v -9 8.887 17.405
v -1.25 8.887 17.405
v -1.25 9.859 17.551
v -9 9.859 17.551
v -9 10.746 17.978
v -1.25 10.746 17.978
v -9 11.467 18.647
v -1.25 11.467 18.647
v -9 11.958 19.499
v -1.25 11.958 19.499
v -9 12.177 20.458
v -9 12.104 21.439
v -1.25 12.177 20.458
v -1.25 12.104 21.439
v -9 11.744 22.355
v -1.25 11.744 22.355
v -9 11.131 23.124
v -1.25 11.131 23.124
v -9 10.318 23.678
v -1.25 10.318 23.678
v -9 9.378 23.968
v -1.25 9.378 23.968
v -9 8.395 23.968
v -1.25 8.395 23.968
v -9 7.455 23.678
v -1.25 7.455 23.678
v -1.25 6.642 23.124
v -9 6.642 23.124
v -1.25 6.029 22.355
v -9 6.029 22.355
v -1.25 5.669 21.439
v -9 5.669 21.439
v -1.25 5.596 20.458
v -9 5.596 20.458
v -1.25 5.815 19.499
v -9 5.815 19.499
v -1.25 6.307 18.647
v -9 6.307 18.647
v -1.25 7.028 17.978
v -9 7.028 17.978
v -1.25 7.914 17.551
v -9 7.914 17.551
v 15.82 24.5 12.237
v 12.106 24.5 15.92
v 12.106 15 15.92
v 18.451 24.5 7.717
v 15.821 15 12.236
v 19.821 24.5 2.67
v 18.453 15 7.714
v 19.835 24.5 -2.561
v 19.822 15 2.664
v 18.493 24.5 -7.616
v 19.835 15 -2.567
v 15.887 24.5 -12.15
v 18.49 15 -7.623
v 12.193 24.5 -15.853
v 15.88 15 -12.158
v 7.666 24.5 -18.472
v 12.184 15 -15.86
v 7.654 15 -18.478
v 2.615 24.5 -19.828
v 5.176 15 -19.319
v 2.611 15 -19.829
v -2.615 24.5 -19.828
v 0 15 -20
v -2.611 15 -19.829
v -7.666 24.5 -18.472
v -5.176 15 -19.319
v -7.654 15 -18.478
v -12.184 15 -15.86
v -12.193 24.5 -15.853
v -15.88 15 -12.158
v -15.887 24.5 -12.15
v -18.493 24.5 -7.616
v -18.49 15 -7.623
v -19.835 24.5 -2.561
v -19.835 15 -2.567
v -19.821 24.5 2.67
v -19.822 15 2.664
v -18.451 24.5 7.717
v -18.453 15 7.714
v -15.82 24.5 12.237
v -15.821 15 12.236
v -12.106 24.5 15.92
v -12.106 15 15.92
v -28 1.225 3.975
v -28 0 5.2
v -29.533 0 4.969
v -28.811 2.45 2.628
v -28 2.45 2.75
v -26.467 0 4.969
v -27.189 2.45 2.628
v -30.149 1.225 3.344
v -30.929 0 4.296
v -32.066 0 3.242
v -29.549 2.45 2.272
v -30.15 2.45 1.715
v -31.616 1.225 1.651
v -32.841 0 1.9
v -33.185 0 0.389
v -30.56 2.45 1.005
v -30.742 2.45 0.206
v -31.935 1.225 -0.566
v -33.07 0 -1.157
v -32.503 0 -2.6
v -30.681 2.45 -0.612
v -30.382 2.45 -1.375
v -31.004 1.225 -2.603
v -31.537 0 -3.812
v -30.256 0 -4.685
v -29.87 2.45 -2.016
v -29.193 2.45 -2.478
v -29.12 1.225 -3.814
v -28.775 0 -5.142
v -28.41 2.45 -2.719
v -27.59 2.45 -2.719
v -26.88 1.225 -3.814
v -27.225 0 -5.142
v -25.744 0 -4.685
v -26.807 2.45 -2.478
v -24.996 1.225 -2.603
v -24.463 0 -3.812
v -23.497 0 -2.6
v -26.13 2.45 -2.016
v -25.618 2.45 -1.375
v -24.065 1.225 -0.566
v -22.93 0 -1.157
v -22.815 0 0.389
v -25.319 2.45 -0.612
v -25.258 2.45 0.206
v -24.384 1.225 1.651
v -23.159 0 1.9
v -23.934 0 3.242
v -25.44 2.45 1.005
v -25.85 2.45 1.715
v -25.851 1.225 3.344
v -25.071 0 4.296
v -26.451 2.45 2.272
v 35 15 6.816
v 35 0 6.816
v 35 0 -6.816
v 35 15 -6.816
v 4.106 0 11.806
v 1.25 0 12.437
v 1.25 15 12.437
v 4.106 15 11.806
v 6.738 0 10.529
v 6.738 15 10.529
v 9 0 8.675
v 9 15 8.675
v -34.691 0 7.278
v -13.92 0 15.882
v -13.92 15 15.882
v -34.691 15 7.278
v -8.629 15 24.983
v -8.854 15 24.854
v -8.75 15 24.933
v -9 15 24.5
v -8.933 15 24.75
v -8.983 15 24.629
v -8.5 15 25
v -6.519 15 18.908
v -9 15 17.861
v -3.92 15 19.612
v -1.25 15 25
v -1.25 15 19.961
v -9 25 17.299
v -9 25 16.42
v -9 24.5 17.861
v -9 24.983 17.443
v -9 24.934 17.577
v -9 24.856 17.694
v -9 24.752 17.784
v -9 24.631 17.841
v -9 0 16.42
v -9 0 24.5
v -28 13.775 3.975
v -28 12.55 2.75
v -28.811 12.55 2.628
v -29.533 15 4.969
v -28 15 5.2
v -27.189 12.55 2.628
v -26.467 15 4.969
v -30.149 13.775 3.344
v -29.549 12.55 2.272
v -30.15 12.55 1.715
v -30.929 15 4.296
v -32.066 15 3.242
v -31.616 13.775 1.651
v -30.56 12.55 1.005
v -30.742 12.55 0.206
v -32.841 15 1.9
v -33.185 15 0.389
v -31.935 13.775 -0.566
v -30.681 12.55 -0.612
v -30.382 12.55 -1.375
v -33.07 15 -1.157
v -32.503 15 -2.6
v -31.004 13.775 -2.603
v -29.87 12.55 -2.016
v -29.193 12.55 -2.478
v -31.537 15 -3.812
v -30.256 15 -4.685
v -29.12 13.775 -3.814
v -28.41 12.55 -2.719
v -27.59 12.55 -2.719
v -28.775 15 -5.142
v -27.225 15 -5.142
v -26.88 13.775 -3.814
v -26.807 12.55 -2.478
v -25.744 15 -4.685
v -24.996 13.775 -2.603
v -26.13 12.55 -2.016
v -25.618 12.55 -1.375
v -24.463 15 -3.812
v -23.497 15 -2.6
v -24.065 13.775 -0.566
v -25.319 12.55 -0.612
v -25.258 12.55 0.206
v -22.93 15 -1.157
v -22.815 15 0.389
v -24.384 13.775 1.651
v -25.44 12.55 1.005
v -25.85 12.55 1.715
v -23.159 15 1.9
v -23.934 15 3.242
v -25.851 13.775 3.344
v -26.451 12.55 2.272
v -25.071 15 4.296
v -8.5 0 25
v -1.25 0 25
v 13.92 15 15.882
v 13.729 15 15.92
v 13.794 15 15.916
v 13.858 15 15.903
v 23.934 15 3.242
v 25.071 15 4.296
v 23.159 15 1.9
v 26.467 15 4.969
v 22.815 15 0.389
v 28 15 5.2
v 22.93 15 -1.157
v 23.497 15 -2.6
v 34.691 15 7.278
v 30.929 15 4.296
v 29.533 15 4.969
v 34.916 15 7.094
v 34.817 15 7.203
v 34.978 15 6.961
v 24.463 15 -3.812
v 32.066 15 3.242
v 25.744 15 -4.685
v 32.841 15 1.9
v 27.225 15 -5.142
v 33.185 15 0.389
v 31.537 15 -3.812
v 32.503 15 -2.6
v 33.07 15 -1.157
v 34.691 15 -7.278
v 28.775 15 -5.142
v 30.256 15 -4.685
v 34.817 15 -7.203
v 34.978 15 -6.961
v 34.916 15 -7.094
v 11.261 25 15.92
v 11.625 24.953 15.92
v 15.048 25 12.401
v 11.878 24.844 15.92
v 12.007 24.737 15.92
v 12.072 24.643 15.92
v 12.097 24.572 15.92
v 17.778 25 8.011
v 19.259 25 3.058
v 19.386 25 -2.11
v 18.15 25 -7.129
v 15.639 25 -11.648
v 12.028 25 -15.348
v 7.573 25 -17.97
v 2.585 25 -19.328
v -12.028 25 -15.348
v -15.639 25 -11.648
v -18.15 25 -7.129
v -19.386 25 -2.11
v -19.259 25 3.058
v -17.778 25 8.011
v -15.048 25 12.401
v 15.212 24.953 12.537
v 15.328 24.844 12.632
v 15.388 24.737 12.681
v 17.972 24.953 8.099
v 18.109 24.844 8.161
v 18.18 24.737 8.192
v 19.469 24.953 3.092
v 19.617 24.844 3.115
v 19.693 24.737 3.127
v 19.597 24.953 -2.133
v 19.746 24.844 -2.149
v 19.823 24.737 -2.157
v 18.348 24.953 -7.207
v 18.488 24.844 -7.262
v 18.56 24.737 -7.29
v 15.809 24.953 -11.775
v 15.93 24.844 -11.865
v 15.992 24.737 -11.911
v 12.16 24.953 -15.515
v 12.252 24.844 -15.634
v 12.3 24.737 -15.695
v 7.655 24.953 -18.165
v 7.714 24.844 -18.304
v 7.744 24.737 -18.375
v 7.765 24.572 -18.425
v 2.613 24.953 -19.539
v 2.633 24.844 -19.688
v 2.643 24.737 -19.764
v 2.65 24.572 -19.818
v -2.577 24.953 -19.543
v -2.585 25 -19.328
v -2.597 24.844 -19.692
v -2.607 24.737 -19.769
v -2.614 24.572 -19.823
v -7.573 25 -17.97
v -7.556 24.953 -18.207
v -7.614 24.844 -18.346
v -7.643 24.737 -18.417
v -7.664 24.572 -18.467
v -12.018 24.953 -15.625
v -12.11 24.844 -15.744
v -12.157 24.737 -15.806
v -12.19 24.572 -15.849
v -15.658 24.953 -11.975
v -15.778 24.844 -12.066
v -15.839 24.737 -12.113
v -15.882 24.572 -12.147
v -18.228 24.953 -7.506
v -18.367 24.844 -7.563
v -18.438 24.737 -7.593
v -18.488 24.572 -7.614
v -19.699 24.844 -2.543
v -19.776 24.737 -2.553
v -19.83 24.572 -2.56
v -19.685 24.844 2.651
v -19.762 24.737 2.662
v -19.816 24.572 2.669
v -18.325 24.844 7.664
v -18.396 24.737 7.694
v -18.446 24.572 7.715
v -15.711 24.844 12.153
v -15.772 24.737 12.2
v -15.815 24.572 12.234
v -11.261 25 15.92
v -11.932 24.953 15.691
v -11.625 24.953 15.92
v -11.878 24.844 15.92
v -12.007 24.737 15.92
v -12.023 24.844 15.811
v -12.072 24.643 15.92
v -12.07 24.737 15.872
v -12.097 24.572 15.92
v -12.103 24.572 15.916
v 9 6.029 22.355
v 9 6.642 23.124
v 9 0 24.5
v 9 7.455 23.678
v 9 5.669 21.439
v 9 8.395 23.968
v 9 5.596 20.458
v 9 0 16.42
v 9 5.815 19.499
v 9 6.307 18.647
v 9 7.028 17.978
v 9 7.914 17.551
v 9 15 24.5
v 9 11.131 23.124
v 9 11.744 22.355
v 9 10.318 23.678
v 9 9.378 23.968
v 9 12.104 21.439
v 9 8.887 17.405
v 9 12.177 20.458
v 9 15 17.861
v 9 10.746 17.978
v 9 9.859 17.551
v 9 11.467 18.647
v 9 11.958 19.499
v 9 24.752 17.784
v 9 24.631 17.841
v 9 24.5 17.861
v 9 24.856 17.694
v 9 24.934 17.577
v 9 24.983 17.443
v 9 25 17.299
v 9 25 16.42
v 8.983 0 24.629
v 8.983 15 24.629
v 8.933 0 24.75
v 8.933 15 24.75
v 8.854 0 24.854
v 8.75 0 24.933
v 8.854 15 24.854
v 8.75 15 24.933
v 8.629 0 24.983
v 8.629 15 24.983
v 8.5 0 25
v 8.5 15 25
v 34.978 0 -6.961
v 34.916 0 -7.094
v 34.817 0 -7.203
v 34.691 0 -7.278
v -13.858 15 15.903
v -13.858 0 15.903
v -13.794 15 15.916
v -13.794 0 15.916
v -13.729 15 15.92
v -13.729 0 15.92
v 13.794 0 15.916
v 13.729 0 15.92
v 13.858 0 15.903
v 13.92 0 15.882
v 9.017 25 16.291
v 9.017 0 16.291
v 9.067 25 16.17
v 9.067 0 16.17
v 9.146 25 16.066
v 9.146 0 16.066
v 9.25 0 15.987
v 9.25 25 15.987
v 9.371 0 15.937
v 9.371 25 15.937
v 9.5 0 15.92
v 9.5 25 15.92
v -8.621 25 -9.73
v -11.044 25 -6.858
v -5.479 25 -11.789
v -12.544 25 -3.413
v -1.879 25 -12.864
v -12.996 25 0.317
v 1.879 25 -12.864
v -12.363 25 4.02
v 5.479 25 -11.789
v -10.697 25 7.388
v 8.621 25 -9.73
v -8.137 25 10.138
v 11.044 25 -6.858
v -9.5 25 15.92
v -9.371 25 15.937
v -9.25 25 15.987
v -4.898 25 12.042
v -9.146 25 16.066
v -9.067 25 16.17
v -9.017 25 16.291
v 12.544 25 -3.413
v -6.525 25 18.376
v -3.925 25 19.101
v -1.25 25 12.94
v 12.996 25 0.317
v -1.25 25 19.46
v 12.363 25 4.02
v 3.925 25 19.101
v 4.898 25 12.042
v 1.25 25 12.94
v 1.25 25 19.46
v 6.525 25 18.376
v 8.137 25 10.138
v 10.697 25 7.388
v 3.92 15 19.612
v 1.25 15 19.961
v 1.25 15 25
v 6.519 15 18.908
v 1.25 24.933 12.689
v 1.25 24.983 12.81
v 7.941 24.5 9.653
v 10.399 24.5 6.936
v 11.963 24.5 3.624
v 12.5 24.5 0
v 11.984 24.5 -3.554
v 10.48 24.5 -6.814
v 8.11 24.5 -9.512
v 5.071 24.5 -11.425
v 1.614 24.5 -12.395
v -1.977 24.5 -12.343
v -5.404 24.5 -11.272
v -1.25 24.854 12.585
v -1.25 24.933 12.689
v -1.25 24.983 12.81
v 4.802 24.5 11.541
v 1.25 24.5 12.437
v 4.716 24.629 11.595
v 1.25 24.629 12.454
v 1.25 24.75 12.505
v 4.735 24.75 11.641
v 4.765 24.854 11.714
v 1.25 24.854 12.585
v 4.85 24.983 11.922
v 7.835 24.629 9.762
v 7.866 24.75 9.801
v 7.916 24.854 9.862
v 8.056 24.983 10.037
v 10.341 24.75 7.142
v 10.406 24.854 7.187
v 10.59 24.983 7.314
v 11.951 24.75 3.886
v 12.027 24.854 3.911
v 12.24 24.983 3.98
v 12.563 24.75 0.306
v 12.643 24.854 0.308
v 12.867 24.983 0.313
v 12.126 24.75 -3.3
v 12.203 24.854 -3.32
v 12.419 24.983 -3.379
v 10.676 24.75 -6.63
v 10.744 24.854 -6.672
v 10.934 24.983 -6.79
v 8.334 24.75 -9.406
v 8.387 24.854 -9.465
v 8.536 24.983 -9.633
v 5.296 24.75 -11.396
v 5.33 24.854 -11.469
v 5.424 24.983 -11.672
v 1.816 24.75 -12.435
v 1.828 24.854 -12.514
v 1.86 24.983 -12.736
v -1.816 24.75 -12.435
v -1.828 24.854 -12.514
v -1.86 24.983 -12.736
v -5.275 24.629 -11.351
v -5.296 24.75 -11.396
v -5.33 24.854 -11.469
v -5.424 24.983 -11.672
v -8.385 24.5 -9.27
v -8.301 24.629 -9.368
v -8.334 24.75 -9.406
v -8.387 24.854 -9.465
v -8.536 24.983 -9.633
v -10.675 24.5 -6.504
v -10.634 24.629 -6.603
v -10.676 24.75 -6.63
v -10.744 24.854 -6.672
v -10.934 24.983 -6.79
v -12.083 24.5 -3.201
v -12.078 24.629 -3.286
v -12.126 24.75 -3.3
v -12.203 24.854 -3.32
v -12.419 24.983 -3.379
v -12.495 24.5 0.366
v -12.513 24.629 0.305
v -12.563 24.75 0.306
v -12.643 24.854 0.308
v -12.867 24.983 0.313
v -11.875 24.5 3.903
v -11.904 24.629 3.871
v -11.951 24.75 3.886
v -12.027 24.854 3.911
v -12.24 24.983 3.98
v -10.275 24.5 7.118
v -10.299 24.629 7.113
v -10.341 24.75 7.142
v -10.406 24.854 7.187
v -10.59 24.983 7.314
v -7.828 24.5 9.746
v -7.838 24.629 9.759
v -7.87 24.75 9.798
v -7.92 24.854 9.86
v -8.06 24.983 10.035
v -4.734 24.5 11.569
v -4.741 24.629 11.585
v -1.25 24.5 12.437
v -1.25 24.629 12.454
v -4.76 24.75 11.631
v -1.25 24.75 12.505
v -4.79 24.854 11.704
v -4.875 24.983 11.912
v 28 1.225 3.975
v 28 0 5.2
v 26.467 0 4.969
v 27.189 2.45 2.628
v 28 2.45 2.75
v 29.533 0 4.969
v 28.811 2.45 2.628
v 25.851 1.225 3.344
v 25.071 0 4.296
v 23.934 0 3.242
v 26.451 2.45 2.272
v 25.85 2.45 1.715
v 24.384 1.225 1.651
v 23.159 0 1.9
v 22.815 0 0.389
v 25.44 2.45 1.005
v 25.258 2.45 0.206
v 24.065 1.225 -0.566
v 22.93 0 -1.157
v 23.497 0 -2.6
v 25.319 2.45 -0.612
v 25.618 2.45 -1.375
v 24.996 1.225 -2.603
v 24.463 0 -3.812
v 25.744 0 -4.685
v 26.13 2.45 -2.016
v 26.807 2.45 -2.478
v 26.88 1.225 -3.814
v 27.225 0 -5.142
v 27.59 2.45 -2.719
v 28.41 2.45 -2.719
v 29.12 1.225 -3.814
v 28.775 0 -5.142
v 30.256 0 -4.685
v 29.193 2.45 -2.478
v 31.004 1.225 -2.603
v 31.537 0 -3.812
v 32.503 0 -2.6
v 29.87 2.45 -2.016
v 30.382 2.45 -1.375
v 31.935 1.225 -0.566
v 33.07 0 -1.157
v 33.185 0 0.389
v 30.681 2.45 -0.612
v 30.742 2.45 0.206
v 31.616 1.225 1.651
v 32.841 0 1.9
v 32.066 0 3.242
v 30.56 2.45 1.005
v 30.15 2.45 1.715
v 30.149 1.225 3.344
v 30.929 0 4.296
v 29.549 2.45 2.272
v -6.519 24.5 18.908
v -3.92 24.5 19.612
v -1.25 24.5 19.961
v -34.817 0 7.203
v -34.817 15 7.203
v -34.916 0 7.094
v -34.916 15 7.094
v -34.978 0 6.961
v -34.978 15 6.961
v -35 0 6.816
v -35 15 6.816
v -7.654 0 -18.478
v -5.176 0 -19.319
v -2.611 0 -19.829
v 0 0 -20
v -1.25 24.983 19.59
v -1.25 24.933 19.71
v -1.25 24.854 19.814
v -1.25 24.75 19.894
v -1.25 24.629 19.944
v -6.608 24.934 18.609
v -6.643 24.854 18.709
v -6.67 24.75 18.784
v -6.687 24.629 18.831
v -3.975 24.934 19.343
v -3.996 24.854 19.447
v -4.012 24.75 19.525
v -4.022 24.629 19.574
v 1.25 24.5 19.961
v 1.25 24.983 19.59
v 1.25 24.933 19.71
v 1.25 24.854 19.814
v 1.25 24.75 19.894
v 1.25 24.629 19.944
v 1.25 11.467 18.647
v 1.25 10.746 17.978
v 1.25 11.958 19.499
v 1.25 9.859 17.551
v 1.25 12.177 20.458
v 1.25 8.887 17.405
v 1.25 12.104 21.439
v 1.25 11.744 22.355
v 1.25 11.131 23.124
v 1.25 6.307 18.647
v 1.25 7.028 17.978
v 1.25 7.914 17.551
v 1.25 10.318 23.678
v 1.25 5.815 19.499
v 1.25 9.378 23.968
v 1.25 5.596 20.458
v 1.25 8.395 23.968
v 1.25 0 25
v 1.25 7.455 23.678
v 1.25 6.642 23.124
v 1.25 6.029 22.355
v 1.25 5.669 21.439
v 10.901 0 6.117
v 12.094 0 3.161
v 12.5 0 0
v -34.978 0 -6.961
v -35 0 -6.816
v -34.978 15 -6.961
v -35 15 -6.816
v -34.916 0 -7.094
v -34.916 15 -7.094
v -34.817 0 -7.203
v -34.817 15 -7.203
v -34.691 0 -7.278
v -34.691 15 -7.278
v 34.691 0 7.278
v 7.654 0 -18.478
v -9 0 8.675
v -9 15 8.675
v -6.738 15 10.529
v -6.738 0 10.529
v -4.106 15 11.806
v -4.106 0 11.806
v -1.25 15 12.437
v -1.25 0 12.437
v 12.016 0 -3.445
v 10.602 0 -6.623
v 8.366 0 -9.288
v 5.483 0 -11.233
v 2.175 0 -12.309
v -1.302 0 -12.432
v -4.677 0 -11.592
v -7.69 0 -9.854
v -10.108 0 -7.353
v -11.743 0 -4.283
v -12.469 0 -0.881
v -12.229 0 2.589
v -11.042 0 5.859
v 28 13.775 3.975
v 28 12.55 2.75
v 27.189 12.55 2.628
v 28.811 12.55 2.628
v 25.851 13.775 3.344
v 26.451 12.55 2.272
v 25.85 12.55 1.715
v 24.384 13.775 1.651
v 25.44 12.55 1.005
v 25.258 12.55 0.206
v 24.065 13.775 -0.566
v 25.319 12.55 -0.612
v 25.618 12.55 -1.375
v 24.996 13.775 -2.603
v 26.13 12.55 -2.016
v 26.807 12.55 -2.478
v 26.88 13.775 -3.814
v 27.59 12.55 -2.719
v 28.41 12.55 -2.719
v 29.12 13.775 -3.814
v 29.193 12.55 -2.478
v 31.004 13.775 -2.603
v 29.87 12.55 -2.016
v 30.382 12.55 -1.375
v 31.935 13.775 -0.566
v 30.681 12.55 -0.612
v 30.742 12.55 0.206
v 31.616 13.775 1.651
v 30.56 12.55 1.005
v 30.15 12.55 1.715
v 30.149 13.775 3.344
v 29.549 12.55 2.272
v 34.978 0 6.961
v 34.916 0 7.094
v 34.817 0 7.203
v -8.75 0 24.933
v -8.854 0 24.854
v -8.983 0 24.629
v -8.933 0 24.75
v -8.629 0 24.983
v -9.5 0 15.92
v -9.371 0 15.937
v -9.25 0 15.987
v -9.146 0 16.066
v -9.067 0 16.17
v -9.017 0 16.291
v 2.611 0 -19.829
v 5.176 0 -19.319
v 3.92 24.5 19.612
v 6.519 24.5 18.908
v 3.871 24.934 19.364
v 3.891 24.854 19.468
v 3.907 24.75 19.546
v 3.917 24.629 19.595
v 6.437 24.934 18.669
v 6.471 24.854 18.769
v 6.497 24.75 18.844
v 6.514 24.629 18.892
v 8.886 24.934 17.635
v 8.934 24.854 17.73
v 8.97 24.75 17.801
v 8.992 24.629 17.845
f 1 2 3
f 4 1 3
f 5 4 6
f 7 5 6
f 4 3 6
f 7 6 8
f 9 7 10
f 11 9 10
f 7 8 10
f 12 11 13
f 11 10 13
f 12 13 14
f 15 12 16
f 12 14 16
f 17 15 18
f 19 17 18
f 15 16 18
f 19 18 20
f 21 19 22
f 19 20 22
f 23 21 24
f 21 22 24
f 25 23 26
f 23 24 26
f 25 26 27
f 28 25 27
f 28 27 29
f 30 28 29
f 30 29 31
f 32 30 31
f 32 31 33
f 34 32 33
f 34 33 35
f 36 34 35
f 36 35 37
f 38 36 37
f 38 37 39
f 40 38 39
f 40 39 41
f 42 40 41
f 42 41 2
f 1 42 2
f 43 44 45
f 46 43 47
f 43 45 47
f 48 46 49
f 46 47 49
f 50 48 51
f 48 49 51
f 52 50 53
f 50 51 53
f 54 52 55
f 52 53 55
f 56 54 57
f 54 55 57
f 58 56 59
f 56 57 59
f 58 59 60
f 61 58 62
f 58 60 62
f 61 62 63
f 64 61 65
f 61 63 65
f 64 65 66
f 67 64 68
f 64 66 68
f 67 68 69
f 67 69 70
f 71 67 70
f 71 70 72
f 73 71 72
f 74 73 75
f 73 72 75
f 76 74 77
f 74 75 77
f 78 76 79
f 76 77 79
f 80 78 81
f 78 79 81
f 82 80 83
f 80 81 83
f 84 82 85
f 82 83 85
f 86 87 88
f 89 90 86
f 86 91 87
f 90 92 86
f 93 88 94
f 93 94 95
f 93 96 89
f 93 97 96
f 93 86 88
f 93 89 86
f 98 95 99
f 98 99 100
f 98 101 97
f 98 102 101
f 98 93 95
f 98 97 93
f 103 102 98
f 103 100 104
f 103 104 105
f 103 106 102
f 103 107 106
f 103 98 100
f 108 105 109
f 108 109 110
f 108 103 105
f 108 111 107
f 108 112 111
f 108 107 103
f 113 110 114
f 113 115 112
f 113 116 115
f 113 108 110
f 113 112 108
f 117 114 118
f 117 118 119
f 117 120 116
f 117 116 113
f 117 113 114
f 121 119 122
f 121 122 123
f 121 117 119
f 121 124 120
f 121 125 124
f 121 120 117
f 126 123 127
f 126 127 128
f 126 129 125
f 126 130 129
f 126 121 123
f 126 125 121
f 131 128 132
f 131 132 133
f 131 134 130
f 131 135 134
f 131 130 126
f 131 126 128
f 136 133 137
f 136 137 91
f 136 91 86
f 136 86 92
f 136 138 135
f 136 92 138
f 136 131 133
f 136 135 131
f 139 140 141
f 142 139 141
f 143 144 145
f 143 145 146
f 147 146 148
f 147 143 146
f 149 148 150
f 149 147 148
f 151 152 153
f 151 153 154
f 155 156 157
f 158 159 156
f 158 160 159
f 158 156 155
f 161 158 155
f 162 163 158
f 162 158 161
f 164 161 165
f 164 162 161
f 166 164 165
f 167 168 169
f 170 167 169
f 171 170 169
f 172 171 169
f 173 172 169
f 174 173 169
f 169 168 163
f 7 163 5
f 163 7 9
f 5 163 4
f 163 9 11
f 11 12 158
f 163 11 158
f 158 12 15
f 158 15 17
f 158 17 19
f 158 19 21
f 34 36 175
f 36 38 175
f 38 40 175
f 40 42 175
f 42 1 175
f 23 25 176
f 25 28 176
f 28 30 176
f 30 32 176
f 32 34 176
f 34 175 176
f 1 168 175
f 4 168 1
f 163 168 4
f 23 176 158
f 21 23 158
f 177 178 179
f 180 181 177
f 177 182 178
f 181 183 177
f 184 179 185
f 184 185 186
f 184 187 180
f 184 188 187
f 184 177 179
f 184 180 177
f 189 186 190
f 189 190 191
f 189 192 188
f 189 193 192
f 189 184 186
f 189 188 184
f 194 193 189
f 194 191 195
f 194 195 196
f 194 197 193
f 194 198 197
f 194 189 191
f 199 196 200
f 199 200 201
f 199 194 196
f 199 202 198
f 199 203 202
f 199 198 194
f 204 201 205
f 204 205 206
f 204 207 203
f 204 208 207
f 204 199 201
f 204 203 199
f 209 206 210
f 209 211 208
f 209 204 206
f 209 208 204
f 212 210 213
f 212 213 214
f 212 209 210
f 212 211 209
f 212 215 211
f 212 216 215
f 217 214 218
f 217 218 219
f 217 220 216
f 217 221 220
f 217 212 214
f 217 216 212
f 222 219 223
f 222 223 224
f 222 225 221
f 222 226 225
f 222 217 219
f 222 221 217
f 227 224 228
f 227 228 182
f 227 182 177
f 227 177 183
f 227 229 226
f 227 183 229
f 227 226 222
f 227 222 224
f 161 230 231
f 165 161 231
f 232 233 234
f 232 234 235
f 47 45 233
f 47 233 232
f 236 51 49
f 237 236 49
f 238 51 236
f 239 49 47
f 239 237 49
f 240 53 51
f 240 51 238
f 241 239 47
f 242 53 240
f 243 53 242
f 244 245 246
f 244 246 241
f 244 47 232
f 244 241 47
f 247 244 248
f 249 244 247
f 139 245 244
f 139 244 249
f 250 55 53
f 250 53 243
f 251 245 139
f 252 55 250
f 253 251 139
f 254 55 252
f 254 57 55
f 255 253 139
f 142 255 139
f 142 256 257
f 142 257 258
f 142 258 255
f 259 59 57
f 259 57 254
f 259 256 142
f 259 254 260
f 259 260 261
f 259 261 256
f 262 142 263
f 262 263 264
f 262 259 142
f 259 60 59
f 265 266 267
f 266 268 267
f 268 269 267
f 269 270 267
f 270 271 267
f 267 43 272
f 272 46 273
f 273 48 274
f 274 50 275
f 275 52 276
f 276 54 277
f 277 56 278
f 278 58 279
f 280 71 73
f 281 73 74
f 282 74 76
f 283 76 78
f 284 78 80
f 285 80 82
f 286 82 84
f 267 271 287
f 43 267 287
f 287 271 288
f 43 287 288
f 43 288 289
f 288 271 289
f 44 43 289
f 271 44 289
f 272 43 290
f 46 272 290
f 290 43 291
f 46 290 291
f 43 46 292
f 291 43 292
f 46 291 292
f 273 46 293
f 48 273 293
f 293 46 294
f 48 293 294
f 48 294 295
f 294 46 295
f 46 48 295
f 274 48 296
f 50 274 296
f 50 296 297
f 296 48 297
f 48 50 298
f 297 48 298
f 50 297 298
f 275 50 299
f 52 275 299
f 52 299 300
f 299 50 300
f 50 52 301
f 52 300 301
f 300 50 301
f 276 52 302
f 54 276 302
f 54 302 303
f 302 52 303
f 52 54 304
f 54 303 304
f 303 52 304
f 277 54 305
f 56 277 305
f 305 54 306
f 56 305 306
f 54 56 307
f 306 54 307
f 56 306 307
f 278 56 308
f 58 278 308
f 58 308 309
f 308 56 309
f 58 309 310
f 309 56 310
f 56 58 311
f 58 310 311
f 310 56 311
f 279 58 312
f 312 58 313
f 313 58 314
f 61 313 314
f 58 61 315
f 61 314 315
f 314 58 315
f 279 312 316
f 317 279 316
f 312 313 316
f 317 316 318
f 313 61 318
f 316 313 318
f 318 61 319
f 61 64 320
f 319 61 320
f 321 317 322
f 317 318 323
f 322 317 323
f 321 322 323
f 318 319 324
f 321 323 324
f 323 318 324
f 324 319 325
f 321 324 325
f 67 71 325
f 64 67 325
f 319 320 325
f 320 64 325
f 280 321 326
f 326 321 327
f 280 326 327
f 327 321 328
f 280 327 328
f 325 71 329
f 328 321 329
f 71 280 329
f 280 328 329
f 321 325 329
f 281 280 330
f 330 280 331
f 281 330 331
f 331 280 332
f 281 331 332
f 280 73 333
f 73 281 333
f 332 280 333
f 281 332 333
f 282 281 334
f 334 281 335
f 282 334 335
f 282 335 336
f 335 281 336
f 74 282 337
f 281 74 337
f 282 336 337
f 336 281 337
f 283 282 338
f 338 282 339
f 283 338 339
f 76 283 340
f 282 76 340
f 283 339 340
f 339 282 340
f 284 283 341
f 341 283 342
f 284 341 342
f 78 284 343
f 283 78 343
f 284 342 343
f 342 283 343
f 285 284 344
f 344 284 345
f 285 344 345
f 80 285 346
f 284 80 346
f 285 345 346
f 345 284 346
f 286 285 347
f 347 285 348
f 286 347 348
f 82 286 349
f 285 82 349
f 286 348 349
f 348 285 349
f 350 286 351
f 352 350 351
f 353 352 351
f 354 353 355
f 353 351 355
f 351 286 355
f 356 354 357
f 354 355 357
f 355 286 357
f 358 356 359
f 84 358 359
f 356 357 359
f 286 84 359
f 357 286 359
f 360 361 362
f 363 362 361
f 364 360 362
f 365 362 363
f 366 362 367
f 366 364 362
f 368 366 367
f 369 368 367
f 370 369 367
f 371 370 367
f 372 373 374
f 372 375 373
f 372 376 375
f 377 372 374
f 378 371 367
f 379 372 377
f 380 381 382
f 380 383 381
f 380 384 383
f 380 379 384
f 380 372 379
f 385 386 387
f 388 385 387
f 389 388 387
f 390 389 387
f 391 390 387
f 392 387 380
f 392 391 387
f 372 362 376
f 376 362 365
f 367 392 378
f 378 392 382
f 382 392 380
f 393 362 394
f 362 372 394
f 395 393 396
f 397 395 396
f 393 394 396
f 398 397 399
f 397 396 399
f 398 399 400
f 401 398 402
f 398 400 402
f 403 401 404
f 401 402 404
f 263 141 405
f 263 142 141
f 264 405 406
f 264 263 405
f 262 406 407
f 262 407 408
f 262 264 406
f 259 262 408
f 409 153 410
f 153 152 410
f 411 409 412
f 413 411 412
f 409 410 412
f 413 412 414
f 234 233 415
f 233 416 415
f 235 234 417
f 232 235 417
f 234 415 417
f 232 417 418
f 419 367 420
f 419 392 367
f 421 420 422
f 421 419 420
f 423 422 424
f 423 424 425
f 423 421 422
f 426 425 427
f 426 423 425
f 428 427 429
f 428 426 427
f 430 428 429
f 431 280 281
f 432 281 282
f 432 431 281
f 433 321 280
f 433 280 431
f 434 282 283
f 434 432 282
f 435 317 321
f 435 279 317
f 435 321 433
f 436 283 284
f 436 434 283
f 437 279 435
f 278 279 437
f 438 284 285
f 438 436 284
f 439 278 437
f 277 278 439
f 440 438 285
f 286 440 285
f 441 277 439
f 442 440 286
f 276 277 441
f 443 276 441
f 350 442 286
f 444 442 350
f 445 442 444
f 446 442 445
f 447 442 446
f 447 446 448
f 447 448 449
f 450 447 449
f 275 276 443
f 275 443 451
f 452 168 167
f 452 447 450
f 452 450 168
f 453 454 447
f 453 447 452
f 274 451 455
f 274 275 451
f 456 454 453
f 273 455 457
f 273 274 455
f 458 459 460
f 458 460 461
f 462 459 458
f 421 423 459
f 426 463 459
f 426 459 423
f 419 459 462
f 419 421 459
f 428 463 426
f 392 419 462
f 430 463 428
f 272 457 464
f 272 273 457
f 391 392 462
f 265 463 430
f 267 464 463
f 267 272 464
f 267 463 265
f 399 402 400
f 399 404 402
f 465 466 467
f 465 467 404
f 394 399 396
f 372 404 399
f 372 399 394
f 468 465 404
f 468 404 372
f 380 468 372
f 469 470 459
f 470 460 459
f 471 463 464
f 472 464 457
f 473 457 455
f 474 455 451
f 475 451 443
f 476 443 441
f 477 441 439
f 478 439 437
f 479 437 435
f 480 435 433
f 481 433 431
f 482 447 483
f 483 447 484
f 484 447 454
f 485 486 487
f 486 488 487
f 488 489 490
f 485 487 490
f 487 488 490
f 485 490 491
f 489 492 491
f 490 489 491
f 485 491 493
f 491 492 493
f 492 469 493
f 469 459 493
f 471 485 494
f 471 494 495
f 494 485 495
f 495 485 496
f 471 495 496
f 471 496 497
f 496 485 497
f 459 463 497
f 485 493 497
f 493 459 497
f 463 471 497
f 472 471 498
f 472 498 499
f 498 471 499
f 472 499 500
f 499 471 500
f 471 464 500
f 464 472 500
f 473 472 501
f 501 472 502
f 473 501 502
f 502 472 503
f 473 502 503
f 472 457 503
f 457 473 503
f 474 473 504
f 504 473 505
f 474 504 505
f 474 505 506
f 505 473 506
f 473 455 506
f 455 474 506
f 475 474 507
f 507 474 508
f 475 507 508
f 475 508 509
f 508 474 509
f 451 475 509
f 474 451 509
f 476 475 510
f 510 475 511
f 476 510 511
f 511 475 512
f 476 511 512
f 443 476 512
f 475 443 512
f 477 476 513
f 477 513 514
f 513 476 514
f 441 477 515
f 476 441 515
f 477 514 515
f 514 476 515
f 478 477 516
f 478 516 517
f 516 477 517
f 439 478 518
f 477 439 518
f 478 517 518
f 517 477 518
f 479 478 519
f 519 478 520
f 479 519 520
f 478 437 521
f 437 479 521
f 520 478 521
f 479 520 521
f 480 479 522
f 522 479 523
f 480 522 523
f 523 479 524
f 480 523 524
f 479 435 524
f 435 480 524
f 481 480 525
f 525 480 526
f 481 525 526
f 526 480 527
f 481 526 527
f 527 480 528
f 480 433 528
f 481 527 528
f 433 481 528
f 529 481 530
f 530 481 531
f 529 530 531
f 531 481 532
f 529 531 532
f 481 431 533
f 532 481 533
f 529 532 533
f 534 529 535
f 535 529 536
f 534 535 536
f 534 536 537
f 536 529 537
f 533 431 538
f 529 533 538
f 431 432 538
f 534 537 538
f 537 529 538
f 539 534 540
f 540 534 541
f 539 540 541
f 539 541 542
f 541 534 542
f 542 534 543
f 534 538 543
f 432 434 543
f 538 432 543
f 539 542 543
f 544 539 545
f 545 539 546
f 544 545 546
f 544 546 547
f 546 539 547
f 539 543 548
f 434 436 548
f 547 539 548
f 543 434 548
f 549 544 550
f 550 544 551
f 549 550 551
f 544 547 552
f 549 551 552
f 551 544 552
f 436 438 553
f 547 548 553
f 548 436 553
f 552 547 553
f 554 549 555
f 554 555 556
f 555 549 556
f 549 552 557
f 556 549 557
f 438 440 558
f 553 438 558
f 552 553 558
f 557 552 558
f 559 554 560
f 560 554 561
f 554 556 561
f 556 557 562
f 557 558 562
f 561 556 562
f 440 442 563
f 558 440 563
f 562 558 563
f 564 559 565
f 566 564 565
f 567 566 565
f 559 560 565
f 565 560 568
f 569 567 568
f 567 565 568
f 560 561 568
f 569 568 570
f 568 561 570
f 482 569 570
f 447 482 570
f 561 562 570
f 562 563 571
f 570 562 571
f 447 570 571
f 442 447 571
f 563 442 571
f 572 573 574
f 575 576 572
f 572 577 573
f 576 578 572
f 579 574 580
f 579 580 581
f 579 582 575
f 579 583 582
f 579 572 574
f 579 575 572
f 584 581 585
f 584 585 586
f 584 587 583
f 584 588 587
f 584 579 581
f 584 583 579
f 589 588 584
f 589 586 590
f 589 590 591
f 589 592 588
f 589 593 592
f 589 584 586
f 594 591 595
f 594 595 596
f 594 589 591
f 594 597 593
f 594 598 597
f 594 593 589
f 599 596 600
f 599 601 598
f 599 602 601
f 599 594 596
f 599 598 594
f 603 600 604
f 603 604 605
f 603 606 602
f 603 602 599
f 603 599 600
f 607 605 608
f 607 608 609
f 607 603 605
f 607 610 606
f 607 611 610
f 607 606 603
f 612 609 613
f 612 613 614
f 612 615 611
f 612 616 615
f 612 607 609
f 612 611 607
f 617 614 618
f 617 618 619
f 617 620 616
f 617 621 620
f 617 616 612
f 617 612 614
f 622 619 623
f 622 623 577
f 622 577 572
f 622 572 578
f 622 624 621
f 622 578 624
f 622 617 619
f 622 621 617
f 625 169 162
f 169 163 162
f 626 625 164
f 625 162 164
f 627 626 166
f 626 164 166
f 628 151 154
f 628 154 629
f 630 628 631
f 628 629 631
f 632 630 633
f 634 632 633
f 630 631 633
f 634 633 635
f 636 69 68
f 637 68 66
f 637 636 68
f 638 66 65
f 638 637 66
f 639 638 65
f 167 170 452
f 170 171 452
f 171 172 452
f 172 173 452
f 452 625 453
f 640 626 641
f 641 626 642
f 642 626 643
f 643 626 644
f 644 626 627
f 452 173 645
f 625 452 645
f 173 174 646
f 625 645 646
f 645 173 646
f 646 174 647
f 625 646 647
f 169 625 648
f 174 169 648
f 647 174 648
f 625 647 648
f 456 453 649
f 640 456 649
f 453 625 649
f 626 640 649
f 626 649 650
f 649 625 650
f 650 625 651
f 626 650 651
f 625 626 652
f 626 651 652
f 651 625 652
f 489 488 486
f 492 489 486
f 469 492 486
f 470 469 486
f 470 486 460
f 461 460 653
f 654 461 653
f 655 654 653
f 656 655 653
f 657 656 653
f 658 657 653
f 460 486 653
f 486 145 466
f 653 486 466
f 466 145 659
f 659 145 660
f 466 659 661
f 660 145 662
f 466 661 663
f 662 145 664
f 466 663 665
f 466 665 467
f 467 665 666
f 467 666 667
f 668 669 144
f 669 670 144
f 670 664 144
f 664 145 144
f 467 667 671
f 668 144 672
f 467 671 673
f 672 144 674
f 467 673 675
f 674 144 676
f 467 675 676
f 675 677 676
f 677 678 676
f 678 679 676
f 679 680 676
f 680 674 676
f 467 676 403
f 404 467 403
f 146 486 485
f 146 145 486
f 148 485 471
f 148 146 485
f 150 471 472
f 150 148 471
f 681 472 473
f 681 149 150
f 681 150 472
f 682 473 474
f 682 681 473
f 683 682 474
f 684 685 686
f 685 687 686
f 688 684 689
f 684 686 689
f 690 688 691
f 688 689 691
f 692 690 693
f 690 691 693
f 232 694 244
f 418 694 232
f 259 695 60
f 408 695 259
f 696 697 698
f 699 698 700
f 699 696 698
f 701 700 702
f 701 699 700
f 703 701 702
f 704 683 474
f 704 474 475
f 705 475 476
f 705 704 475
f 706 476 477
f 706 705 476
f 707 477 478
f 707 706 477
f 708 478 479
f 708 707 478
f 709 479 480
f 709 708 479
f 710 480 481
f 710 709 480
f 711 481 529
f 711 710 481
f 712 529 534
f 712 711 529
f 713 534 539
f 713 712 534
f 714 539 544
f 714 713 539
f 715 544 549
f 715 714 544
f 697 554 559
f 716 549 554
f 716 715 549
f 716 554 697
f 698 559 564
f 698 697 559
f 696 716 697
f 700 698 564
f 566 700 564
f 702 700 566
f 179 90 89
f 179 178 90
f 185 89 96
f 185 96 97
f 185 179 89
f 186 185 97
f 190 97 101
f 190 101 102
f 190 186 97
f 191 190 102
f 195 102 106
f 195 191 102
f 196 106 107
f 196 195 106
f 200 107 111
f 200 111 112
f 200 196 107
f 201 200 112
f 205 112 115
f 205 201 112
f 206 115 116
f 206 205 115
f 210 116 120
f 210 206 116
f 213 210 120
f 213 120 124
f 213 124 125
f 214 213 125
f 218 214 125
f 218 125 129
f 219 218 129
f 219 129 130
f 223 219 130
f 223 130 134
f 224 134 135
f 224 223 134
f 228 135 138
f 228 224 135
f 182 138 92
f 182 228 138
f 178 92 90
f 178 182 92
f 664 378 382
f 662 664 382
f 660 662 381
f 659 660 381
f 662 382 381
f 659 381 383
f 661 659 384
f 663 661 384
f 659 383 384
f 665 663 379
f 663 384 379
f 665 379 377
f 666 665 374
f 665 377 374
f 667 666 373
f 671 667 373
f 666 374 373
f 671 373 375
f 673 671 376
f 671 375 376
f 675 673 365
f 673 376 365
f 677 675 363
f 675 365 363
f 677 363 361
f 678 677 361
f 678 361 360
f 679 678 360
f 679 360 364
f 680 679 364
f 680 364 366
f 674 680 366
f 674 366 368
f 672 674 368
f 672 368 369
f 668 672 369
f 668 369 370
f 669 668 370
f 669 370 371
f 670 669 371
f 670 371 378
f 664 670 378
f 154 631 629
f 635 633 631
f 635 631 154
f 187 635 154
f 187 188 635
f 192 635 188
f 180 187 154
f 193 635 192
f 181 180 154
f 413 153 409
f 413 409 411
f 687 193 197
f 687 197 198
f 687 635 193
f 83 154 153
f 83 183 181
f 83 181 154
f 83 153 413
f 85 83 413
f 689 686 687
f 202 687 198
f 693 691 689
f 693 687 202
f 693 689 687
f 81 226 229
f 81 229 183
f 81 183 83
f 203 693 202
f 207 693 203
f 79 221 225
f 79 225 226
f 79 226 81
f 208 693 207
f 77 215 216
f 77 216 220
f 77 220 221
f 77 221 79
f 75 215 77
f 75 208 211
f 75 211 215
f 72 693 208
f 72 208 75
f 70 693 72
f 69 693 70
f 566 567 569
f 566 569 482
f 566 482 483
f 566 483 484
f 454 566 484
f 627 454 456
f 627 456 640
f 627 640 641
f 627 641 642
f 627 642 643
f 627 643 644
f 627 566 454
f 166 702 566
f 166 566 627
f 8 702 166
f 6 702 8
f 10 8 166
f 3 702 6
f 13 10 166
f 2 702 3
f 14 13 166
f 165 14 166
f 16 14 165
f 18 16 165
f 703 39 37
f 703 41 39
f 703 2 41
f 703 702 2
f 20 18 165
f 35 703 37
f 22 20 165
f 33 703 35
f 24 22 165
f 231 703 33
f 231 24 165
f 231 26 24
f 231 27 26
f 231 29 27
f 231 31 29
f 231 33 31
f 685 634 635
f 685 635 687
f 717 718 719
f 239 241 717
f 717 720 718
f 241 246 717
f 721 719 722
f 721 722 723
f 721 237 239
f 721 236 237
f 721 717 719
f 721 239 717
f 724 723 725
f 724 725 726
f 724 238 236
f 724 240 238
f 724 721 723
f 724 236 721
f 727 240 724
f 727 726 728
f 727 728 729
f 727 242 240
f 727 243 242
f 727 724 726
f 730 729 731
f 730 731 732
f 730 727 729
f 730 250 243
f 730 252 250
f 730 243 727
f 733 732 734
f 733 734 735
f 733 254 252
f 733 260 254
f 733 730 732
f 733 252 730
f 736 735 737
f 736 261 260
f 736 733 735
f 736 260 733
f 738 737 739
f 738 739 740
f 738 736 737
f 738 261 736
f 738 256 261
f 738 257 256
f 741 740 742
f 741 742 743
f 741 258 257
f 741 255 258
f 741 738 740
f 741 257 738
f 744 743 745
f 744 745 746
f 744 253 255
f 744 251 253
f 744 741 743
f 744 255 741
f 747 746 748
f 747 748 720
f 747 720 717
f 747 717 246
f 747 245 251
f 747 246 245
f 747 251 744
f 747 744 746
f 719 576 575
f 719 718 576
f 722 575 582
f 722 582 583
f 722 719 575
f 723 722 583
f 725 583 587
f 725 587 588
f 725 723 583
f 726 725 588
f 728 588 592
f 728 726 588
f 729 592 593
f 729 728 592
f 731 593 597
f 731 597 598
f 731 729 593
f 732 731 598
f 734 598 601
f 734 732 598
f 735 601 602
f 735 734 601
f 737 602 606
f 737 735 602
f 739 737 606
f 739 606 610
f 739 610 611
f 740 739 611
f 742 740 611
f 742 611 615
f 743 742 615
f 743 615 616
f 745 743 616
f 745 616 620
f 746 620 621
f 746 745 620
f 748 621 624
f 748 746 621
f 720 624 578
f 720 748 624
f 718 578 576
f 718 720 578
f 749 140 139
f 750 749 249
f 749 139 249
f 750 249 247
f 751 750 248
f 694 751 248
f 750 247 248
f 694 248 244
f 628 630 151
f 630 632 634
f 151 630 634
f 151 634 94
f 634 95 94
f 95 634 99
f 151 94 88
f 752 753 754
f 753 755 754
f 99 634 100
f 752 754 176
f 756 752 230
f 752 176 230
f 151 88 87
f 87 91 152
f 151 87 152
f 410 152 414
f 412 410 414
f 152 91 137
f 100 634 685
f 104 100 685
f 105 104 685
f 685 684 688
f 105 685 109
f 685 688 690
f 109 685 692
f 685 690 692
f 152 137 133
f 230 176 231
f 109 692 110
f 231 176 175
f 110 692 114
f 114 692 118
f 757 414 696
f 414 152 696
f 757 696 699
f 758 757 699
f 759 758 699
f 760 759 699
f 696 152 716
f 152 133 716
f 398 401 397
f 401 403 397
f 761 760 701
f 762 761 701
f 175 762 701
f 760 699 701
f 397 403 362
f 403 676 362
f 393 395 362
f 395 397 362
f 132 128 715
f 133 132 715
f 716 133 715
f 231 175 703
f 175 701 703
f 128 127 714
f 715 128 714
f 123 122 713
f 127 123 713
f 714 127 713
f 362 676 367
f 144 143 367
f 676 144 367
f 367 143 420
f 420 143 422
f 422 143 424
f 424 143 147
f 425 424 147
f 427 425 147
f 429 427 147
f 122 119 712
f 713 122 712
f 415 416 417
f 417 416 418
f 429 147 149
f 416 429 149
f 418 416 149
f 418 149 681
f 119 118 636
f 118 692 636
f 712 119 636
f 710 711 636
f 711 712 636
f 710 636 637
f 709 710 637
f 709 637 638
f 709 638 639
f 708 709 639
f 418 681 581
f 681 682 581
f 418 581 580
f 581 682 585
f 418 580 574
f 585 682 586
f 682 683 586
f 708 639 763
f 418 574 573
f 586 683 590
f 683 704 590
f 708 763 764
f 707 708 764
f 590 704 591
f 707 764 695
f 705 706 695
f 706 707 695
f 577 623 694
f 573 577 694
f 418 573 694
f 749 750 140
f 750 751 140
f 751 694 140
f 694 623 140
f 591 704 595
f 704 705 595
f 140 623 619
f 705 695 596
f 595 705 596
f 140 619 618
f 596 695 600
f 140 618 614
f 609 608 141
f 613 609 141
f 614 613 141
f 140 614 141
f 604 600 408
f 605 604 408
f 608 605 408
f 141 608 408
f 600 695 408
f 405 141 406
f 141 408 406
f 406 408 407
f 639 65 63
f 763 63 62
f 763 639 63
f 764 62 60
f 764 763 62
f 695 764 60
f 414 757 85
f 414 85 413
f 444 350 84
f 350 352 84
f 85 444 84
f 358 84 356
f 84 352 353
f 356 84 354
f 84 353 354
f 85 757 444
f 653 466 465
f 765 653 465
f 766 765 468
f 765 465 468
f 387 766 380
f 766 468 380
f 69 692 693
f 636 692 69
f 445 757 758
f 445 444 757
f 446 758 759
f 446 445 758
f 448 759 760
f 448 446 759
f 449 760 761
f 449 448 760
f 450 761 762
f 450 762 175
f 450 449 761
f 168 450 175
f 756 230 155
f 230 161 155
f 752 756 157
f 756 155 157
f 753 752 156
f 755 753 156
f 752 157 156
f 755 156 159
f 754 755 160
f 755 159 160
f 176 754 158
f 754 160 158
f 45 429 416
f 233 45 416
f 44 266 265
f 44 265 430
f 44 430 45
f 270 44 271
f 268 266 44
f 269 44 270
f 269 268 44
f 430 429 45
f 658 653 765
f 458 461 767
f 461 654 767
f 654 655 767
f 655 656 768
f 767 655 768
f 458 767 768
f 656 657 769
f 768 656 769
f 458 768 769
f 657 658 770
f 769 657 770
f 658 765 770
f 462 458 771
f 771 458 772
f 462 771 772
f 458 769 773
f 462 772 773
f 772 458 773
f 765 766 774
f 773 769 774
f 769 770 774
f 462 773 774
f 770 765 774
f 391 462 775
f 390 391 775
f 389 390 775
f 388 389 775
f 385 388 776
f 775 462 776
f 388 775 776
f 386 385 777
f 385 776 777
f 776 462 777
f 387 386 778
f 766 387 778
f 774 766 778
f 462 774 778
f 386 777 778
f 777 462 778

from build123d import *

# Parameters (mm, degrees)
SKETCH1_W                                    = 70
SKETCH1_H                                    = 40
EXTRUDE1_DEPTH                               = 15
SKETCH3_R                                    = 20
EXTRUDE2_DEPTH                               = 10
SKETCH21_W                                   = 18
SKETCH21_H                                   = 45
EXTRUDE7_DEPTH                               = 15
F_25_0_MM_DOWEL_HOLES1_DEPTH                 = 15
F_25_0_MM_DOWEL_HOLES1_2_OUTLINE_R           = 12.5
F_25_0_MM_DOWEL_HOLES1_2_DEPTH               = 25
CSK_FOR_M5_COUNTERSUNK_FLAT_HEAD_SCR_2_COUNT = 2
CSK_FOR_M5_COUNTERSUNK_FLAT_HEAD_SCR_2_PITCH = 56
EXTRUDE8_START                               = -15
EXTRUDE8_DEPTH                               = 15
FILLET10_R                                   = 0.5
EXTRUDE9_DEPTH                               = 46.552167896
SKETCH23_W                                   = 2.5
SKETCH23_H                                   = 25
EXTRUDE10_DEPTH                              = 50.749371906
FILLET11_R                                   = 0.5
M6_CLEARANCE_HOLE1_D                         = 6.6


with BuildPart() as part:
    # Sketch1 → Extrude1 (new body)
    with BuildSketch(Plane(origin=(0, 0, 0), x_dir=(1, 0, 0), z_dir=(0, 1, 0))):
        Rectangle(SKETCH1_W, SKETCH1_H)
    extrude(amount=EXTRUDE1_DEPTH)

    # Sketch3 → Extrude2 (add)
    with BuildSketch(Plane(origin=(0, 15, 0), x_dir=(1, 0, 0), z_dir=(0, 1, 0))):
        with Locations(Location((0, 0, 0), (0, 0, 270))):
            Circle(SKETCH3_R)
    extrude(amount=EXTRUDE2_DEPTH)

    # 25.0 mm Dowel Holes1 2 outline → 25.0 mm Dowel Holes1 2 (cut)
    with BuildSketch(Plane(origin=(0, 0, 0), x_dir=(1, 0, 0), z_dir=(0, 1, 0))):
        Circle(F_25_0_MM_DOWEL_HOLES1_2_OUTLINE_R)
    extrude(amount=F_25_0_MM_DOWEL_HOLES1_2_DEPTH, mode=Mode.SUBTRACT)

    # Sketch11 → CSK for M5 Countersunk Flat Head Screw1 (revolve, cut)
    with BuildSketch(Plane(origin=(-28, 15, 0), x_dir=(0, 0, 1), z_dir=(1, 0, 0))):
        Polygon((0, 0), (0, 15), (5.2, 15), (2.75, 12.55), (2.75, 2.45), (5.2, 0), align=None)
    csk_for_m5_countersunk_flat_head_screw1 = revolve(axis=Axis((-28, 21.35, 0), (0, -1, 0)), mode=Mode.SUBTRACT)

    # CSK for M5 Countersunk Flat Head Scr 2: CSK for M5 Countersunk Flat Head Screw1 ×2
    with Locations(*[(i * CSK_FOR_M5_COUNTERSUNK_FLAT_HEAD_SCR_2_PITCH, 0, 0) for i in range(1, CSK_FOR_M5_COUNTERSUNK_FLAT_HEAD_SCR_2_COUNT)]):
        add(csk_for_m5_countersunk_flat_head_screw1, mode=Mode.SUBTRACT)


with BuildPart() as body_2:
    # Sketch21 → Extrude7 (new body)
    with BuildSketch(Plane.XZ):
        with Locations((0, 2.5)):
            Rectangle(SKETCH21_W, SKETCH21_H)
    extrude(amount=-EXTRUDE7_DEPTH)

    # Ø25.0 mm Dowel Holes1: read off the stored shape, not the designer's step
    # Ø25.0 mm Dowel Holes1 outline → Ø25.0 mm Dowel Holes1 (cut)
    with BuildSketch(Plane(origin=(0, 0, 0), x_dir=(1, 0, 0), z_dir=(0, 1, 0))):
        with BuildLine():
            Line((-9, 20), (-9, -8.674675786))
            ThreePointArc((-9, -8.674675786), (0, -12.5), (9, -8.674675786))
            Line((9, -8.674675786), (9, 20))
            Line((9, 20), (-9, 20))
        make_face()
    extrude(amount=F_25_0_MM_DOWEL_HOLES1_DEPTH, mode=Mode.SUBTRACT)


with BuildPart() as part_1:
    add(part.part)

    # Sculpt4: read off the stored shape, not the designer's step
    # Sculpt4: union body 2
    add(body_2.part)

    # Extrude8: read off the stored shape, not the designer's step
    # Extrude8 outline → Extrude8 (cut)
    with BuildSketch(Plane(origin=(0, 15, 0), x_dir=(1, 0, 0), z_dir=(0, 1, 0)).offset(EXTRUDE8_START)):
        Polygon((35, -20), (35, -7.150369323), (9, -17.919921944), (9, -20), align=None)
        with BuildLine():
            Line((-35, 20), (-35, 7.150369323))
            Line((-35, 7.150369323), (-7.653668647, 18.47759065))
            ThreePointArc((-7.653668647, 18.47759065), (-3.901806443, 19.615705608), (-6e-09, 20))
            Line((-6e-09, 20), (-35, 20))
        make_face()
        Polygon((-9, -20), (-9, -17.919921944), (-35, -7.150369323), (-35, -20), align=None)
        with BuildLine():
            Line((35, 20), (-6e-09, 20))
            ThreePointArc((-6e-09, 20), (3.901806437, 19.615705609), (7.653668647, 18.47759065))
            Line((7.653668647, 18.47759065), (35, 7.150369323))
            Line((35, 7.150369323), (35, 20))
        make_face()
    extrude(amount=EXTRUDE8_DEPTH, mode=Mode.SUBTRACT)

    # Fillet10
    fillet10_edges = [part_1.edges().sort_by_distance(p)[0] for p in [
        (0, 25, -20),
        (-12.5, 25, 0),
        (-35, 7.5, -7.150369323),
        (35, 7.5, -7.150369323),
        (35, 7.5, 7.150369323),
        (-35, 7.5, 7.150369323),
        (-9, 7.5, 25),
        (9, 7.5, 25),
    ]]
    fillet(fillet10_edges, radius=FILLET10_R)

    # Sketch22 → Extrude9 (cut, symmetric)
    with BuildSketch(Plane(origin=(0, 15, 0), x_dir=(1, 0, 0), z_dir=(0, 1, 0))):
        Polygon((-9, -149.154505921), (-9, -17.919921944), (-9, -15.919921944), (-13.828427125, -15.919921944), (-145.063011101, -15.919921944), (-328.697324176, -203.452594264), (-192.634313075, -336.68717824), align=None)
    extrude9 = extrude(amount=EXTRUDE9_DEPTH, both=True, mode=Mode.SUBTRACT)

    # Mirror3: Extrude9 across plane
    add(extrude9.mirror(Plane(origin=(0, 0, 0), x_dir=(0, 0, 1), z_dir=(1, 0, 0))), mode=Mode.SUBTRACT)

    # Sketch23 → Extrude10 (cut, through all)
    with BuildSketch(Plane.XZ):
        with Locations((0, 12.5)):
            Rectangle(SKETCH23_W, SKETCH23_H)
    extrude(amount=-EXTRUDE10_DEPTH, mode=Mode.SUBTRACT)

    # Fillet11
    fillet11_edges = [part_1.edges().sort_by_distance(p)[0] for p in [
        (-9, 12.5, 15.919921944),
        (-13.828427124, 7.5, 15.919921944),
        (13.828427124, 7.5, 15.919921944),
        (9, 12.5, 15.919921944),
    ]]
    fillet(fillet11_edges, radius=FILLET11_R)

    # M6 Clearance Hole1 (through all)
    with Locations(Plane.ZY.offset(9)):
        with Locations((20.704631923, 8.886572753)):
            Hole(M6_CLEARANCE_HOLE1_D / 2)


solid = part_1.part
